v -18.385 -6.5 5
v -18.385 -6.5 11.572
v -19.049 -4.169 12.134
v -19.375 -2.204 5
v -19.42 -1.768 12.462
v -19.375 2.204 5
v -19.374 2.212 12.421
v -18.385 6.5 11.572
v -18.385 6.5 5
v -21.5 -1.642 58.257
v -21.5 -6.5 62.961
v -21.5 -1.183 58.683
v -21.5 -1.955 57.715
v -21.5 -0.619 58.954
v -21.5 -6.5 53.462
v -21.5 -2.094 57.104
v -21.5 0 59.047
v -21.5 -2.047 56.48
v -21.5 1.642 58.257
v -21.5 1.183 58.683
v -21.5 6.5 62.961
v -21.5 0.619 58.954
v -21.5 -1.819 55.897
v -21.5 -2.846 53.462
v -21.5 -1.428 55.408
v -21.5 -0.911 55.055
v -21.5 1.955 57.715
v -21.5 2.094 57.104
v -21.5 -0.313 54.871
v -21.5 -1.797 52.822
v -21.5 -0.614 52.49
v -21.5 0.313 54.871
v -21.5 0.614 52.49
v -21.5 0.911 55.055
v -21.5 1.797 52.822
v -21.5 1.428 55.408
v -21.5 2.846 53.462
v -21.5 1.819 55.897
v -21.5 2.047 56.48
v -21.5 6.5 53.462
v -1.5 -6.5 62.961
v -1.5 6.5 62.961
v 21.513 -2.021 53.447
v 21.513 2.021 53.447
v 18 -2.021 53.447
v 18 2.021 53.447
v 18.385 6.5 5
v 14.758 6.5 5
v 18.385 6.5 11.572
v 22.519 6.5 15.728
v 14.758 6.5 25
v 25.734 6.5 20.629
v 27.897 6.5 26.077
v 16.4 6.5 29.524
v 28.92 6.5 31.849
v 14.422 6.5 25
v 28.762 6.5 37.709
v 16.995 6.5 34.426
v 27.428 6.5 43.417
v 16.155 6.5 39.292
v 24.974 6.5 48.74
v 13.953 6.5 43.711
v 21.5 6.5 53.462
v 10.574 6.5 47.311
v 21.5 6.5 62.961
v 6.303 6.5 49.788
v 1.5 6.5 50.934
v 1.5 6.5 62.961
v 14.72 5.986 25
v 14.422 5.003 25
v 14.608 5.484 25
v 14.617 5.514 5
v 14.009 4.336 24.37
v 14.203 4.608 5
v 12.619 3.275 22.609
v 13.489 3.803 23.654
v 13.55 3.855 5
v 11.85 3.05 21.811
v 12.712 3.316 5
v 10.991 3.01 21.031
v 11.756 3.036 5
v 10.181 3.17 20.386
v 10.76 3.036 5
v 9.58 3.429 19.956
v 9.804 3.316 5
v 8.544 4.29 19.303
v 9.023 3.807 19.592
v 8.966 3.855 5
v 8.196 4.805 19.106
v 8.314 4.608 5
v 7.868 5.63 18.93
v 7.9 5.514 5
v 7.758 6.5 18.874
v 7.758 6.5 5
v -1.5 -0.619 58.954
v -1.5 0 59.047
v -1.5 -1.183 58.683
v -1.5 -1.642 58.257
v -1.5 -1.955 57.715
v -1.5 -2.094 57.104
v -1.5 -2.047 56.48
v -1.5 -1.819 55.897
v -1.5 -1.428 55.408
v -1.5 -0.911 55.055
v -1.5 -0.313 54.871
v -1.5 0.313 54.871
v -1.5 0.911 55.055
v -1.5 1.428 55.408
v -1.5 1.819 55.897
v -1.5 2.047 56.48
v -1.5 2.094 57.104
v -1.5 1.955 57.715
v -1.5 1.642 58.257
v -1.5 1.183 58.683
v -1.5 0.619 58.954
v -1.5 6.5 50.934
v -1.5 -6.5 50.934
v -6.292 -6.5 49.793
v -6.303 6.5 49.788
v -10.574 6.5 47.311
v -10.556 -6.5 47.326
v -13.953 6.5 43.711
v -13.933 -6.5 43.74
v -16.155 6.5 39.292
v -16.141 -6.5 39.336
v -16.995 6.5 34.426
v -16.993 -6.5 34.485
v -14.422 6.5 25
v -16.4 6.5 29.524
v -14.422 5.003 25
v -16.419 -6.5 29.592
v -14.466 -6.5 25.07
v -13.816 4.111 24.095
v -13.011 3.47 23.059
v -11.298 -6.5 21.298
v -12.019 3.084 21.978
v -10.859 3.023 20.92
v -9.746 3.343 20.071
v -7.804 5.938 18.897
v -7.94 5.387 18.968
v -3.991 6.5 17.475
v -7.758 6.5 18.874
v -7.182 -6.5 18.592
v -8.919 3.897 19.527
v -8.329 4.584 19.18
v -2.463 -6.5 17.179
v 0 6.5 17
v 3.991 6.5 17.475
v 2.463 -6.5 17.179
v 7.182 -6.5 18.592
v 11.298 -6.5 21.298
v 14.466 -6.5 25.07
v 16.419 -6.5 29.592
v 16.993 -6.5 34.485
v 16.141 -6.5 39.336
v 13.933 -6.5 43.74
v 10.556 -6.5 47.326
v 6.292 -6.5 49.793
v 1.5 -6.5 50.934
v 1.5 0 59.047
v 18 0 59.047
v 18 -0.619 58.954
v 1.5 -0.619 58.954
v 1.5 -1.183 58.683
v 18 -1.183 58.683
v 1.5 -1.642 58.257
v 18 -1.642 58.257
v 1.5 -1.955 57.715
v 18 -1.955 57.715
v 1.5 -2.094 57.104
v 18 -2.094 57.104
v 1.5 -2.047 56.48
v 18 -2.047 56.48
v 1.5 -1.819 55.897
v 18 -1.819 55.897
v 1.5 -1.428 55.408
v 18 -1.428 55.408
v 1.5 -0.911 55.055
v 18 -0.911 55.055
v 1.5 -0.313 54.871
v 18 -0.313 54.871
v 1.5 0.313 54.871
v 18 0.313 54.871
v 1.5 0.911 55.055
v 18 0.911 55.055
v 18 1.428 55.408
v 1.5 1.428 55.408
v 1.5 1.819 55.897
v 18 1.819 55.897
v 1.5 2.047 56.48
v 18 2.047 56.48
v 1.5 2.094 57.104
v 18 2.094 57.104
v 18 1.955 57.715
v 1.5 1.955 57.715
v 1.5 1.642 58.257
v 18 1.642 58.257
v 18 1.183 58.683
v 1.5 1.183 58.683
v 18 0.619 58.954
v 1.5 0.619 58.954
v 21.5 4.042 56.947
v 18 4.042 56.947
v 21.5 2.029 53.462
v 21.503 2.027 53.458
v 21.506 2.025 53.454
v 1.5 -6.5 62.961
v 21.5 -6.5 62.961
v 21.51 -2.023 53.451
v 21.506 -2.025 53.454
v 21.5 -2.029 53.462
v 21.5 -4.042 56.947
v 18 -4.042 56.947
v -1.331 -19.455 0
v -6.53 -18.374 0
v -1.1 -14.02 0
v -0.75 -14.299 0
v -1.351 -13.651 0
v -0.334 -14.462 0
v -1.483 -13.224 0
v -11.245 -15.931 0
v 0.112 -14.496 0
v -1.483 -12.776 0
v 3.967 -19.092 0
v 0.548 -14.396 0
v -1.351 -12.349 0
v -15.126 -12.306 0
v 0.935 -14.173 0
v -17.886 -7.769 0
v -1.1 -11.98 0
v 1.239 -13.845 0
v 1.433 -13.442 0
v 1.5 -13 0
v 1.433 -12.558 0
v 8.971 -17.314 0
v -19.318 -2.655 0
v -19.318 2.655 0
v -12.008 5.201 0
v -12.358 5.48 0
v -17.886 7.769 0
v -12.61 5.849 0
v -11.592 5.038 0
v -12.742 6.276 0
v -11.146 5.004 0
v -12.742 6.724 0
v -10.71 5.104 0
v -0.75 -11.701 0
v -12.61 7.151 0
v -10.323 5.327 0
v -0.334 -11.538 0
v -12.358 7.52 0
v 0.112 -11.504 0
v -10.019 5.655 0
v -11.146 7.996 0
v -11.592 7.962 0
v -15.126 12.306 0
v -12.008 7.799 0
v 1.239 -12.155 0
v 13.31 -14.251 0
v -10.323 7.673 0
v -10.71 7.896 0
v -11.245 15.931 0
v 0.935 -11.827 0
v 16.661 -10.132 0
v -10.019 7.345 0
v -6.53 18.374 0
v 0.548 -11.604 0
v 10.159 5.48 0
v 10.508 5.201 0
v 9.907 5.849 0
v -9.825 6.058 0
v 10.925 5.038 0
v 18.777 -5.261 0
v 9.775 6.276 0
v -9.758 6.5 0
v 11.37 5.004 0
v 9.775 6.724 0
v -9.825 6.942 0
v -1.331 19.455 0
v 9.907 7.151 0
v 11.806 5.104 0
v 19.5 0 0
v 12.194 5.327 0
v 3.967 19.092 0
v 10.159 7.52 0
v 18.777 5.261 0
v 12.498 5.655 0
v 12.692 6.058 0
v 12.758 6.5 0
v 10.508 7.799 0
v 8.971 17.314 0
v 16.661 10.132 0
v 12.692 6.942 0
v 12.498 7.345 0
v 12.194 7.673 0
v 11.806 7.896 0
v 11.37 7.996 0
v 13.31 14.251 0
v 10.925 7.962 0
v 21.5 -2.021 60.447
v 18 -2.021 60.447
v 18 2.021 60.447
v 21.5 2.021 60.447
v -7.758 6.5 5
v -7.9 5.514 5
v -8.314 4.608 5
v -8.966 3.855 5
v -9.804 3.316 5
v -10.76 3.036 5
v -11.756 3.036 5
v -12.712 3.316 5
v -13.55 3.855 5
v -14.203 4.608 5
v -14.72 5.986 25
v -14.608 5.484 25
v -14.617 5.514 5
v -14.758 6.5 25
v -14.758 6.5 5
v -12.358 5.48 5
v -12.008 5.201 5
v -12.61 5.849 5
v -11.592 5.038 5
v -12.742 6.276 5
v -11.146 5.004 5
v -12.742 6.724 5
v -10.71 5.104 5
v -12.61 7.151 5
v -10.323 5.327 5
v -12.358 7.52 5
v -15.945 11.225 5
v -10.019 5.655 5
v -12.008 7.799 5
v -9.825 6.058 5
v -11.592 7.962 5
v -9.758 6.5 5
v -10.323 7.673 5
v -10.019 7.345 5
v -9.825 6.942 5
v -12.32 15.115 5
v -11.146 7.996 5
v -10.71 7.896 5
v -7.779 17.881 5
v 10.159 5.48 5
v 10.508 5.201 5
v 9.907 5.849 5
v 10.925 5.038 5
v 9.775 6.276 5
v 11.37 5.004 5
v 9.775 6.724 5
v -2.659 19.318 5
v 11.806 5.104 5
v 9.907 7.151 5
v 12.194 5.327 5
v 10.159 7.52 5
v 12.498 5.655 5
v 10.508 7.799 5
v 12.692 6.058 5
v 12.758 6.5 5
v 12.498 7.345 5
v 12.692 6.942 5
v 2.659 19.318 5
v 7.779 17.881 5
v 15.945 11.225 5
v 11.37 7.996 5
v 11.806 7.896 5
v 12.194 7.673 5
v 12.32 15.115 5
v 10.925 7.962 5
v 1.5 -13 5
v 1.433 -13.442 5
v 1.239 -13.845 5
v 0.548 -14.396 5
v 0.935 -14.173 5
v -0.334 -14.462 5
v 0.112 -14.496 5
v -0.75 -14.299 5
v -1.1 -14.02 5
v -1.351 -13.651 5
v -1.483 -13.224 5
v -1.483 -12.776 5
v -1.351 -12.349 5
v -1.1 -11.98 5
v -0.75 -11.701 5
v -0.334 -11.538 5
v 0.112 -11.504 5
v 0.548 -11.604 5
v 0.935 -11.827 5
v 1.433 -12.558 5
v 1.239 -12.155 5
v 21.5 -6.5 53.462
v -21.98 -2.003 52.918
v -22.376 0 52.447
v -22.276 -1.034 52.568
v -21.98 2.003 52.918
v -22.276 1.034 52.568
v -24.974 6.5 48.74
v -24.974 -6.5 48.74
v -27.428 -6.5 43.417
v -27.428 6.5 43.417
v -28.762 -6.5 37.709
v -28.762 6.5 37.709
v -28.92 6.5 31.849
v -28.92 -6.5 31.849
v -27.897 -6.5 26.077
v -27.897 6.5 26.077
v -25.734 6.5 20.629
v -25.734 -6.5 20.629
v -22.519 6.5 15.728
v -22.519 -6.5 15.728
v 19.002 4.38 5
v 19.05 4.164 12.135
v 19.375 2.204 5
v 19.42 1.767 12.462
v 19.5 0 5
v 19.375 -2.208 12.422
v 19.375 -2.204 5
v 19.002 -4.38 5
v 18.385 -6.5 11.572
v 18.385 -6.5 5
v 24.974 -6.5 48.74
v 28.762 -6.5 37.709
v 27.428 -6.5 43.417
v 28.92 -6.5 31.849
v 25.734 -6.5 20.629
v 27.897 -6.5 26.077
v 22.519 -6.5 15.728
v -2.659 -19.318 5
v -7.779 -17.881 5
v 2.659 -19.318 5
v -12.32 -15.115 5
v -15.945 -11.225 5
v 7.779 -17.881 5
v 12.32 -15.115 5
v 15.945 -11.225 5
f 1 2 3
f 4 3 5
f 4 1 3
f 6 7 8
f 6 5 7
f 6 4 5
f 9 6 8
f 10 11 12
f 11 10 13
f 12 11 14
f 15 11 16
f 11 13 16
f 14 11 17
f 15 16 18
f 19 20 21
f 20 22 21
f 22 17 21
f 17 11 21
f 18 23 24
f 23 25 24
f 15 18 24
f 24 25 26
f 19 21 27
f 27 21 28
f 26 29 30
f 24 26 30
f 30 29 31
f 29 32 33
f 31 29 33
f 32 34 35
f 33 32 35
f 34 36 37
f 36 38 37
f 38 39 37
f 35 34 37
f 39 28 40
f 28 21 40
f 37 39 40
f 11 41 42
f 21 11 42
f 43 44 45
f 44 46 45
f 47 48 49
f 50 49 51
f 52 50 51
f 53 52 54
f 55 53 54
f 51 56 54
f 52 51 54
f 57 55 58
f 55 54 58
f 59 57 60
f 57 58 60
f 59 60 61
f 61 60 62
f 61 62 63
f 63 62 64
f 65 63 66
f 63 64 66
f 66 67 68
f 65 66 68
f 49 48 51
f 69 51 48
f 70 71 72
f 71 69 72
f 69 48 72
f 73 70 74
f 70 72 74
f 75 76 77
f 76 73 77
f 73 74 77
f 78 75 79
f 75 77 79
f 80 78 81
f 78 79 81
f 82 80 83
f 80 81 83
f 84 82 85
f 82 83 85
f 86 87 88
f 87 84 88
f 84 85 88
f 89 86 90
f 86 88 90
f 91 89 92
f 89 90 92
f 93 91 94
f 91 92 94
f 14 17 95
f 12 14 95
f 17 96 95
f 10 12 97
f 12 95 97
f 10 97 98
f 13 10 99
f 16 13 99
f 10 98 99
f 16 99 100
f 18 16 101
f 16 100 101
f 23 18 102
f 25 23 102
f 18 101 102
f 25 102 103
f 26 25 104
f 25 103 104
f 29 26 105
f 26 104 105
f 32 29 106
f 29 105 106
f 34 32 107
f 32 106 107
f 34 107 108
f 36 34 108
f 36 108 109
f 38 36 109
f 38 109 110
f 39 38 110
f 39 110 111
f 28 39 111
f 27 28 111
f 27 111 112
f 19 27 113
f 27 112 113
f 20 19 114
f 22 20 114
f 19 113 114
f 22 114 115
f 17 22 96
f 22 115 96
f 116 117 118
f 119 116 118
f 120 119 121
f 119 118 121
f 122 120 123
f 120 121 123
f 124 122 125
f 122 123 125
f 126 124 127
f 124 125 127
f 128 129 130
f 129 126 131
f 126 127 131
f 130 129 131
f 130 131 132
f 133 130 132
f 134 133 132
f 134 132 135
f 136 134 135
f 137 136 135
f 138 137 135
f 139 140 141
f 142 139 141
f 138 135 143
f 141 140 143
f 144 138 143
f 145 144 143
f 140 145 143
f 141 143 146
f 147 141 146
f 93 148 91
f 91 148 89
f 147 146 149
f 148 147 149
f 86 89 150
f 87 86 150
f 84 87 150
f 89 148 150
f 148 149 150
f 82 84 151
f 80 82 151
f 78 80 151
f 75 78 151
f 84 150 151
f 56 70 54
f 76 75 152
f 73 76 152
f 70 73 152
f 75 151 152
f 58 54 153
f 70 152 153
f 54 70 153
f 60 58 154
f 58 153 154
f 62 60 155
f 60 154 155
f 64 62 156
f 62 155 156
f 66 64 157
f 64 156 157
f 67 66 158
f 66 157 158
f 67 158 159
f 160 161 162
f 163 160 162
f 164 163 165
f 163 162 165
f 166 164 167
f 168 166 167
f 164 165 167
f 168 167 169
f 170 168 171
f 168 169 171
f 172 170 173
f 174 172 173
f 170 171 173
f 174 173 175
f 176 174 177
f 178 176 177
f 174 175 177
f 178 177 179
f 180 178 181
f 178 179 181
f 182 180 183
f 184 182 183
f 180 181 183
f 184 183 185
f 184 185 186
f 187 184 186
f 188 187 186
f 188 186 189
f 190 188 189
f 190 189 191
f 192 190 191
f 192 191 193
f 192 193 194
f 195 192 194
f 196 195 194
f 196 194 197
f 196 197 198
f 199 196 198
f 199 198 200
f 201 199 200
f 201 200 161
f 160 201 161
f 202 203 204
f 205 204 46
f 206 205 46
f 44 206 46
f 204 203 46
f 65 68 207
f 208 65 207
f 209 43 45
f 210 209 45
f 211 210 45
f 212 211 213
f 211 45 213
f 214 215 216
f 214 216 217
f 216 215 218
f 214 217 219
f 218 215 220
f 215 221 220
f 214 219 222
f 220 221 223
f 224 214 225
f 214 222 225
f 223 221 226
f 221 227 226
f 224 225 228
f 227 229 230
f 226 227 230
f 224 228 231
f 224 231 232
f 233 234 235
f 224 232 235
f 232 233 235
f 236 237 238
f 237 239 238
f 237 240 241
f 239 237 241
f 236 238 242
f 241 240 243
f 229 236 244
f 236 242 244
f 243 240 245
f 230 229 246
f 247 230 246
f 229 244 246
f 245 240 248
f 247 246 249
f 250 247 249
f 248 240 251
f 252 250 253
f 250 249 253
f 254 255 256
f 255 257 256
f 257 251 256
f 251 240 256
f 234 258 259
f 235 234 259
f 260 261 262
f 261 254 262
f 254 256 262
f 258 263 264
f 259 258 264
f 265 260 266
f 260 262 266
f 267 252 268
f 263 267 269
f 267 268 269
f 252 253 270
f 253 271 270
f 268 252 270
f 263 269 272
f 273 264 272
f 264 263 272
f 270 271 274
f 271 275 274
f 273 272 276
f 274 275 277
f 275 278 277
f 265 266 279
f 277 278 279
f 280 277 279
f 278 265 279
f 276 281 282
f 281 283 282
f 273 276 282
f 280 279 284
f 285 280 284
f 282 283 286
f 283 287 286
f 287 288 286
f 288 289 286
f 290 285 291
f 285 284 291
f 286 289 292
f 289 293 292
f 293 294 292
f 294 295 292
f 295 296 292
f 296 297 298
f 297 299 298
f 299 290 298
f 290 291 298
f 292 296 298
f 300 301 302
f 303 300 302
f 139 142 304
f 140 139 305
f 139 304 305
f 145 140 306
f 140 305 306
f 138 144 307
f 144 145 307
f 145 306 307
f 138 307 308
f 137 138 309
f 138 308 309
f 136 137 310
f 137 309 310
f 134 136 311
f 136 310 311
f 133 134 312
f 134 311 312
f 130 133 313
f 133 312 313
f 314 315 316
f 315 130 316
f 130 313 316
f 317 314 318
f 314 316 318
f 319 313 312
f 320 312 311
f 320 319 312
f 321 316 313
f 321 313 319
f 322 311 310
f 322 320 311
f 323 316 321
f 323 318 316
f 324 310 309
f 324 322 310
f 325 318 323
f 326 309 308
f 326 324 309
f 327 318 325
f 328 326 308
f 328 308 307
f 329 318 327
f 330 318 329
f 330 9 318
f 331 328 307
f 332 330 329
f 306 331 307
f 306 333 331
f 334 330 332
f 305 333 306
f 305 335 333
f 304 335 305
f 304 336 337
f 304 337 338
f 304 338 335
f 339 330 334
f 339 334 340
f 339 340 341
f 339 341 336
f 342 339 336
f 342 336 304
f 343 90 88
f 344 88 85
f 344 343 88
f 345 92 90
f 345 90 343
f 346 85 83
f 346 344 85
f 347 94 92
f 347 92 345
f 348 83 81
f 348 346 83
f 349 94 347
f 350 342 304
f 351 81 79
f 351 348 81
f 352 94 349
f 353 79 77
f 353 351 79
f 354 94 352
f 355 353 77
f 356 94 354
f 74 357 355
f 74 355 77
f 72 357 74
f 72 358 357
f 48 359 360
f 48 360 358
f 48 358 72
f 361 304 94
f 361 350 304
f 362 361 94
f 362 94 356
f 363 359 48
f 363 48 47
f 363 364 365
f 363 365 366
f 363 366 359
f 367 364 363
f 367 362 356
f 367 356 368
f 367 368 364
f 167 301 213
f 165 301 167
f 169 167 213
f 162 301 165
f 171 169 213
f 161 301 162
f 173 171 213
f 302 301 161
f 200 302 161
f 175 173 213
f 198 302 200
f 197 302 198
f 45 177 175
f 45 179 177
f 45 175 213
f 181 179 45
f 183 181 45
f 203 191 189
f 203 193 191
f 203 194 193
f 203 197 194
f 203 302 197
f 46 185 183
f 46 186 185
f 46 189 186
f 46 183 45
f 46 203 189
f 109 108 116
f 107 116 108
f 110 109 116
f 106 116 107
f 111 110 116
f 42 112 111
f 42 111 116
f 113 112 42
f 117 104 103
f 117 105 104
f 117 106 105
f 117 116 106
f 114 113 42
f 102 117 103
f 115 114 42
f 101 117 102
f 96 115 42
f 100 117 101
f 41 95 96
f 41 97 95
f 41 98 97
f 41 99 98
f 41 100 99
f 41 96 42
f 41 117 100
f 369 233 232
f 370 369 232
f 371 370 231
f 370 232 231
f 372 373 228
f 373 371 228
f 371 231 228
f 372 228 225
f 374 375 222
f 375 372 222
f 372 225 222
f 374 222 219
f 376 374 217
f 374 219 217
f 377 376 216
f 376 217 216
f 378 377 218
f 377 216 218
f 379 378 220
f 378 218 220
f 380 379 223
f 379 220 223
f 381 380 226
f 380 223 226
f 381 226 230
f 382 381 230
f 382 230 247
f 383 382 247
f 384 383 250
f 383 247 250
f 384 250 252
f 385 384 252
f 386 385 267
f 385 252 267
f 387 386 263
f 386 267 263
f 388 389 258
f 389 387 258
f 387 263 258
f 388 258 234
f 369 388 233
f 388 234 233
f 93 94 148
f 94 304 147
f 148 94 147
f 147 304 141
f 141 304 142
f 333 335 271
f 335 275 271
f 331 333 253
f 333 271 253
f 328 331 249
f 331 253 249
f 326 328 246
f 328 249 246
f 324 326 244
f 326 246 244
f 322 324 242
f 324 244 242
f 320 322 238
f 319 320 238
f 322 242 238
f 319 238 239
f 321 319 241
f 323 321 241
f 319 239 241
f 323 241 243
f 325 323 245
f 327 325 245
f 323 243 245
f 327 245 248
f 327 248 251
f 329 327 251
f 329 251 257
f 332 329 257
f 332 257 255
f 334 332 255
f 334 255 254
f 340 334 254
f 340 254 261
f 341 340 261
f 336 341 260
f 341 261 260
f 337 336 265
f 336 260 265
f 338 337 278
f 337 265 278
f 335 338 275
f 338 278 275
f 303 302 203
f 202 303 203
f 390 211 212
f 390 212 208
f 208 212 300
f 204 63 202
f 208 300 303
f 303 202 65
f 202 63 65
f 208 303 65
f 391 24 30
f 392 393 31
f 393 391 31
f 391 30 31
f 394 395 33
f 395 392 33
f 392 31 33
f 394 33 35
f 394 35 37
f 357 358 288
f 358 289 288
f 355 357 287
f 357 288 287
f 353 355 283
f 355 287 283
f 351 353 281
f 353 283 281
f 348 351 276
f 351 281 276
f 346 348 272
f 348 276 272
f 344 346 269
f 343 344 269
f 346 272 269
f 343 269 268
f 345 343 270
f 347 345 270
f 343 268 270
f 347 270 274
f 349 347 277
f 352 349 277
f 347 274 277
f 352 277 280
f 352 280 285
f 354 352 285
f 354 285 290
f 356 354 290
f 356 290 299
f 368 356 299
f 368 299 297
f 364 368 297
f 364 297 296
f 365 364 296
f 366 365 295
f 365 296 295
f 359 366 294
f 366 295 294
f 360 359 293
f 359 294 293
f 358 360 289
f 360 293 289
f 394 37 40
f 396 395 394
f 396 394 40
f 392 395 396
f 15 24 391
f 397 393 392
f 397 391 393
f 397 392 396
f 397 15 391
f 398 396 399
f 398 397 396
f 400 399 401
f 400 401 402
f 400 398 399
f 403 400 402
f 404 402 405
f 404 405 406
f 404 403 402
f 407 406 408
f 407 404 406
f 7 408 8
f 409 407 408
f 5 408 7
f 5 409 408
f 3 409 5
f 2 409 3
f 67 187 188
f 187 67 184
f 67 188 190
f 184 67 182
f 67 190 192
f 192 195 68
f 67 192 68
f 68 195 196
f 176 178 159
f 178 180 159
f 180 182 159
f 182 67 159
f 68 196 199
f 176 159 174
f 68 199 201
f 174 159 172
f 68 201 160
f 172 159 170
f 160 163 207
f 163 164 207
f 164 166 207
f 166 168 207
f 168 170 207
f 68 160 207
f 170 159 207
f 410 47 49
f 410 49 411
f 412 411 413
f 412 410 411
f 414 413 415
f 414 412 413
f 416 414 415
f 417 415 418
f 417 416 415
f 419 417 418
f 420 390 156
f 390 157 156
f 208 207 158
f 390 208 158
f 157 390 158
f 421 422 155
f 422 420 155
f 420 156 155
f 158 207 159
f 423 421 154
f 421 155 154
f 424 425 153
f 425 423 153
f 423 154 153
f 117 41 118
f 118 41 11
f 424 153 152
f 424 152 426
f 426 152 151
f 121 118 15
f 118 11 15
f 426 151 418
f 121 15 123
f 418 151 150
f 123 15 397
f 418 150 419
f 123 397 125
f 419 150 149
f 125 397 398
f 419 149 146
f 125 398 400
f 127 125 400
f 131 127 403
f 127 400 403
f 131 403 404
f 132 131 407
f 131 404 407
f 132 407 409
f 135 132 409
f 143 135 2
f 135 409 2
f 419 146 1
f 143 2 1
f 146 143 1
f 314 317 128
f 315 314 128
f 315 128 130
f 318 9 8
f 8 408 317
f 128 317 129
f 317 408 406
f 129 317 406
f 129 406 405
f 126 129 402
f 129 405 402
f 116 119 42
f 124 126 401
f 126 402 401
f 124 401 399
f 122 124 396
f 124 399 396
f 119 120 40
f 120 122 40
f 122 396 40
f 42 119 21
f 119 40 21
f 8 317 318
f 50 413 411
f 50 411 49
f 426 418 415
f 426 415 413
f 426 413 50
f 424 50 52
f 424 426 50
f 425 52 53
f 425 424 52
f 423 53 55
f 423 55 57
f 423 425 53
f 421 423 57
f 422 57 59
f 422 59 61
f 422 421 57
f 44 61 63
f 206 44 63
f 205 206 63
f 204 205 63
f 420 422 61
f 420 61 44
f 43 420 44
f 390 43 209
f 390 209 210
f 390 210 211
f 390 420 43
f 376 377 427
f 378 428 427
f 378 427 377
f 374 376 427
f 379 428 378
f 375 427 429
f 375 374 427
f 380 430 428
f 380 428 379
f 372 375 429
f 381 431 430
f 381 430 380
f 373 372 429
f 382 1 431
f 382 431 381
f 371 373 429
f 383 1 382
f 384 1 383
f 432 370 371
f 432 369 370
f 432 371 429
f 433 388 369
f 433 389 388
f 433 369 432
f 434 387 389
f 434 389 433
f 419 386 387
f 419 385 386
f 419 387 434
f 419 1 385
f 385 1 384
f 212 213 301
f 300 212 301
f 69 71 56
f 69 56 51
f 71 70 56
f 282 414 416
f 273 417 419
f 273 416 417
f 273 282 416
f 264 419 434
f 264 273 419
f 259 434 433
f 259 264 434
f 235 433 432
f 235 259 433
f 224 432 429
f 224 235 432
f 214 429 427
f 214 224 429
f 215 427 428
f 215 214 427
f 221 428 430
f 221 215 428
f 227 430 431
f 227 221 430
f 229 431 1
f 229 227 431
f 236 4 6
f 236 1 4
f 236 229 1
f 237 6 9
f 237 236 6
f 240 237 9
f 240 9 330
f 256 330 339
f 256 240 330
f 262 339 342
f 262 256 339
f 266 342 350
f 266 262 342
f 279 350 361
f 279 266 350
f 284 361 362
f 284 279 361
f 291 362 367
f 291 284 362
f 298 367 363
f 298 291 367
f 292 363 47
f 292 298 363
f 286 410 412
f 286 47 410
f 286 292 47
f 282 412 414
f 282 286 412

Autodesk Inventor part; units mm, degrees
ref_plane "YZ Plane" through (0, 0, 0) normal (1, 0, 0) x (0, 1, 0)
ref_plane "XZ Plane" through (0, 0, 0) normal (0, 1, 0) x (-1, 0, 0)
ref_plane "XY Plane" through (0, 0, 0) normal (0, 0, 1) x (1, 0, 0)
sketch "Skizze1" plane through (0, 0, 0) normal (0, 0, 1) x (1, 0, 0)
  circle A0 centre (-11.2583, 6.5) radius 1.5 projected
  circle A1 centre (-11.2583, -6.5) radius 1.5 projected
  circle A2 centre (0, -13) radius 1.5 projected
  circle A3 centre (11.2583, -6.5) radius 1.5 projected
  circle A4 centre (11.2583, 6.5) radius 1.5 projected
  circle A5 centre (0, 13) radius 1.5 projected
  arc A6 (14.3761, 1.8914) -> (11.9393, 3.5783) centre (12.3932, 1.6305) ccw projected
  arc A7 (14.3761, -1.8914) -> (14.3761, 1.8914) centre (0, 0) ccw projected
  arc A8 (11.9393, -3.5783) -> (14.3761, -1.8914) centre (12.3932, -1.6305) ccw projected
  arc A9 (11.9393, -3.5783) -> (9.0685, -8.5505) centre (11.2583, -6.5) ccw projected
  arc A10 (8.826, -11.5044) -> (9.0685, -8.5505) centre (7.6087, -9.9176) ccw projected
  arc A11 (5.5501, -13.3958) -> (8.826, -11.5044) centre (0, 0) ccw projected
  arc A12 (2.8707, -12.1288) -> (5.5501, -13.3958) centre (4.7846, -11.5481) ccw projected
  arc A13 (2.8707, -12.1288) -> (-2.8707, -12.1288) centre (0, -13) ccw projected
  arc A14 (-5.5501, -13.3958) -> (-2.8707, -12.1288) centre (-4.7846, -11.5481) ccw projected
  arc A15 (-8.826, -11.5044) -> (-5.5501, -13.3958) centre (0, 0) ccw projected
  arc A16 (-9.0685, -8.5505) -> (-8.826, -11.5044) centre (-7.6087, -9.9176) ccw projected
  arc A17 (-9.0685, -8.5505) -> (-11.9393, -3.5783) centre (-11.2583, -6.5) ccw projected
  arc A18 (-14.3761, -1.8914) -> (-11.9393, -3.5783) centre (-12.3932, -1.6305) ccw projected
  arc A19 (-14.3761, 1.8914) -> (-14.3761, -1.8914) centre (0, 0) ccw projected
  arc A20 (-11.9393, 3.5783) -> (-14.3761, 1.8914) centre (-12.3932, 1.6305) ccw projected
  arc A21 (-11.9393, 3.5783) -> (-9.0685, 8.5505) centre (-11.2583, 6.5) ccw projected
  arc A22 (-8.826, 11.5044) -> (-9.0685, 8.5505) centre (-7.6087, 9.9176) ccw projected
  arc A23 (-5.5501, 13.3958) -> (-8.826, 11.5044) centre (0, 0) ccw projected
  arc A24 (-2.8707, 12.1288) -> (-5.5501, 13.3958) centre (-4.7846, 11.5481) ccw projected
  arc A25 (-2.8707, 12.1288) -> (2.8707, 12.1288) centre (0, 13) ccw projected
  arc A26 (5.5501, 13.3958) -> (2.8707, 12.1288) centre (4.7846, 11.5481) ccw projected
  arc A27 (8.826, 11.5044) -> (5.5501, 13.3958) centre (0, 0) ccw projected
  arc A28 (9.0685, 8.5505) -> (8.826, 11.5044) centre (7.6087, 9.9176) ccw projected
  arc A29 (9.0685, 8.5505) -> (11.9393, 3.5783) centre (11.2583, 6.5) ccw projected
  circle A30 centre (0, 0) radius 17.5 projected
  circle A31 centre (0, 0) radius 19.5
  point P0 (0, 0)
  dimension "d0" = 39
extrude "Extrusion1" add sketch "Skizze1" along normal blind 5 contours A7 A8 A9 A10 A11 A12 A13 A14 A15 A16 A17 A18 A19 A20 A21 A22 A23 A24 A25 A26 A27 A28 A29 A6 | A30 | A31
ref_plane "Arbeitsebene1" through (11.2583, -6.5, 0) normal (0, -1, 0) x (0, 0, 1)
sketch "Skizze7" plane through (11.2583, -6.5, 0) normal (0, -1, 0) x (0, 0, 1)
  line L0 (0, 21.0167) -> (5, 21.0167) projected
  line L1 (5, 21.0167) -> (5, 1.5) projected
  line L2 (5, 1.5) -> (0, 1.5) projected
  line L3 (0, 1.5) -> (0, 21.0167) projected
  line L4 (5, -7.1264) -> (0, -7.1264) projected
  line L5 (0, -7.1264) -> (0, -1.5) projected
  line L6 (0, -1.5) -> (5, -1.5) projected
  line L7 (5, -1.5) -> (5, -7.1264) projected
  line L8 (0, 29.6431) -> (5, 29.6431) projected
  line L9 (5, 29.6431) -> (5, 24.0167) projected
  line L10 (5, 24.0167) -> (0, 24.0167) projected
  line L11 (0, 24.0167) -> (0, 29.6431) projected
  line L12 (5, 1.5) -> (17, 1.5)
  line L13 (17, 1.5) -> (17, 21.0167)
  line L14 (17, 21.0167) -> (5, 21.0167)
  line L15 (5, 21.0167) -> (5, 1.5)
  arc A0 (50.9337, 12.7583) -> (50.9337, 9.7583) centre (34, 11.2583) ccw
  arc A1 (62.9612, 12.7583) -> (62.9612, 9.7583) centre (34, 11.2583) ccw
  line L16 (50.9337, 9.7583) -> (62.9612, 9.7583)
  line L17 (50.9337, 12.7583) -> (62.9612, 12.7583)
  line L18 (34, 11.2583) -> (5, 11.2583) construction
  line L19 (5, -7.1264) -> (11.5723, -7.1264)
  line L20 (5, 29.6431) -> (11.5723, 29.6431)
  line L21 (5, -7.1264) -> (5, 29.6431)
  point P0 (0, 11.2583)
  dimension "d26" = 3
  dimension "d27" = 17
  dimension "d28" = 12
extrude "Extrusion6" add sketch "Skizze7" against normal blind 13 contours L14 A1 L1 | L21 L9 L20 A1 L14 | A1 L12 L1 | A1 L14 L13 L12 | A1 L17 A0 L13 L14 | L12 A1 L19 L7 L21 | L12 L13 A0 L16 A1
sketch "Skizze8" plane through (1.5, -6.5, 50.9337) normal (-1, 0, 0) x (0, 0, 1)
  line L0 (12.0275, 0) -> (0, 0) projected
  line L1 (0, 0) -> (0, 13) projected
  line L2 (0, 13) -> (12.0275, 13) projected
  line L3 (12.0275, 13) -> (12.0275, 0) projected
  line L4 (-45.9337, 25.9422) -> (-45.9337, 19.5) projected
  line L5 (-45.9337, 19.5) -> (-45.9337, 13) projected
  line L6 (-45.9337, 13) -> (-33.8674, 13) projected
  line L7 (-33.8674, 13) -> (-33.8674, 0) projected
  line L8 (-33.8674, 0) -> (-45.9337, 0) projected
  line L9 (-45.9337, 0) -> (-45.9337, -6.5) projected
  line L10 (-45.9337, -6.5) -> (-50.9337, -6.5) projected
  line L11 (-50.9337, -6.5) -> (-50.9337, 19.5) projected
  line L12 (-50.9337, 19.5) -> (-50.9337, 25.9422) projected
  line L13 (-50.9337, 25.9422) -> (-45.9337, 25.9422) projected
  line L14 (-45.9337, 19.5) -> (-50.9337, 19.5) projected
  line L15 (-45.9337, -6.5) -> (-45.9337, -12.9422) projected
  line L16 (-45.9337, -12.9422) -> (-50.9337, -12.9422) projected
  line L17 (-50.9337, -12.9422) -> (-50.9337, -6.5) projected
  point P0 (-50.9337, 6.5)
extrude "Extrusion7" add sketch "Skizze8" against normal blind 20 contours L0 L1 L2 L3
sketch "Skizze9" plane through (-1.5, -6.5, 62.9612) normal (1, 0, 0) x (0, 0, -1)
  line L0 (12.0275, 0) -> (0, 0) projected
  line L1 (0, 0) -> (0, 13) projected
  line L2 (0, 13) -> (12.0275, 13) projected
  line L3 (12.0275, 13) -> (12.0275, 0) projected
  line L4 (57.9612, -12.9422) -> (57.9612, -6.5) projected
  line L5 (57.9612, -6.5) -> (57.9612, 0) projected
  line L6 (57.9612, 0) -> (45.8949, 0) projected
  line L7 (45.8949, 0) -> (45.8949, 13) projected
  line L8 (45.8949, 13) -> (57.9612, 13) projected
  line L9 (57.9612, 13) -> (57.9612, 19.5) projected
  line L10 (57.9612, 19.5) -> (62.9612, 19.5) projected
  line L11 (62.9612, 19.5) -> (62.9612, -6.5) projected
  line L12 (62.9612, -6.5) -> (62.9612, -12.9422) projected
  line L13 (62.9612, -12.9422) -> (57.9612, -12.9422) projected
  line L14 (57.9612, -6.5) -> (62.9612, -6.5) projected
  line L15 (57.9612, 19.5) -> (57.9612, 25.9422) projected
  line L16 (57.9612, 25.9422) -> (62.9612, 25.9422) projected
  line L17 (62.9612, 25.9422) -> (62.9612, 19.5) projected
  point P0 (62.9612, 6.5)
extrude "Extrusion8" add sketch "Skizze9" against normal blind 20 contours L0 L1 L2 L3
sketch "Skizze10" plane through (0, 0, 5) normal (0, 0, 1) x (1, 0, 0)
  circle A0 centre (0, 13) radius 1.5 projected
  circle A1 centre (11.2583, 6.5) radius 1.5 projected
  circle A2 centre (11.2583, -6.5) radius 1.5 projected
  circle A3 centre (0, -13) radius 1.5 projected
  circle A4 centre (-11.2583, -6.5) radius 1.5 projected
  circle A5 centre (-11.2583, 6.5) radius 1.5 projected
  circle A6 centre (0, 0) radius 19.5 projected
  circle A7 centre (11.2583, 6.5) radius 3.5
  circle A8 centre (-11.2583, 6.5) radius 3.5
  line L0 (12.7583, 6.5) -> (9.7583, 6.5) projected
  point P0 (0, 0)
  dimension "d35" = 7
extrude "Extrusion9" cut sketch "Skizze10" along normal blind 20 contours L0 A1 | A1 L0 | A5 | A7 | A8
sketch "Skizze11" plane through (0, 0, 0) normal (0, 0, -1) x (-1, 0, 0)
  circle A0 centre (0, 13) radius 1.5 projected
  circle A1 centre (-11.2583, 6.5) radius 1.5 projected
  circle A2 centre (-11.2583, -6.5) radius 1.5 projected
  circle A3 centre (0, -13) radius 1.5 projected
  circle A4 centre (11.2583, -6.5) radius 1.5 projected
  circle A5 centre (11.2583, 6.5) radius 1.5 projected
  circle A6 centre (0, 0) radius 19.5 projected
  point P0 (0, 0)
extrude "Extrusion10" add sketch "Skizze11" against normal up to surface (5 mm away) contours A0 | A2 | A4
sketch "Skizze13" plane through (-21.5, -6.5, 62.9612) normal (-1, 0, 0) x (0, 0, 1)
  line L0 (-12.0275, 0) -> (0, 0) projected
  line L1 (-12.0275, 0) -> (-12.0275, 13) projected
  line L2 (0, 13) -> (-12.0275, 13) projected
  line L3 (0, 0) -> (0, 13) projected
  line L4 (-12.0275, 0) -> (0, 0)
  line L5 (0, 0) -> (0, 13)
  line L6 (0, 13) -> (-12.0275, 13)
  line L7 (-12.0275, 13) -> (-12.0275, 0)
  line L8 (-12.0275, 0) -> (0, 13) construction
  line L9 (0, 0) -> (-12.0275, 13) construction
  point P0 (-62.9612, 6.5)
  point P1 (-6.0137, 6.5)
hole "Bohrung2" at (-21.5, 0, 56.9474) direction (1, 0, 0) diameter 4.2 end through all
sketch "Skizze14" plane through (-21.5, -6.5, 62.9612) normal (-1, 0, 0) x (0, 0, 1)
  circle A0 centre (-6.0137, 6.5) radius 2.1 projected
  line L0 (-9.4997, 0) -> (-9.4997, 13) projected
  line L1 (-9.4997, 0) -> (0, 0) projected
  line L2 (0, 0) -> (0, 13) projected
  line L3 (0, 13) -> (-9.4997, 13) projected
  circle A1 centre (-6.0137, 6.5) radius 4.5
  point P0 (-62.9612, 6.5)
  dimension "d47" = 9
extrude "Extrusion11" cut sketch "Skizze14" along normal blind 2 contours A0 | A1 L0 | L0 A1
sketch "Skizze15" plane through (21.5, -6.5, 50.9337) normal (1, 0, 0) x (0, 0, -1)
  circle A0 centre (-6.0137, 6.5) radius 2.1 projected
  line L0 (-2.5278, 13) -> (-2.5278, 0) projected
  line L1 (-2.5278, 13) -> (-12.0275, 13) projected
  line L2 (-12.0275, 13) -> (-12.0275, 0) projected
  line L3 (-12.0275, 0) -> (-2.5278, 0) projected
  line L4 (-6.0137, 10.5415) -> (-2.5137, 8.5207)
  line L5 (-2.5137, 8.5207) -> (-2.5137, 4.4793)
  line L6 (-2.5137, 4.4793) -> (-6.0137, 2.4585)
  line L7 (-6.0137, 2.4585) -> (-9.5137, 4.4793)
  line L8 (-9.5137, 4.4793) -> (-9.5137, 8.5207)
  line L9 (-9.5137, 8.5207) -> (-6.0137, 10.5415)
  line L10 (-12.0275, 13) -> (-12.0275, 0) projected
  point P0 (50.9337, 6.5)
  dimension "d50" = 7
extrude "Extrusion12" cut sketch "Skizze15" along normal mid plane 7 contours A0 | L4 L5 L6 L0 | L0 L6 L7 L8 L9 L4
sketch "Skizze16" plane through (0, 0, 5) normal (0, 0, 1) x (1, 0, 0)
  line L0 (-18.3848, -6.5) -> (-18.3848, 6.5) projected
  arc A0 (-18.3848, 6.5) -> (-18.3848, -6.5) centre (0, 0) ccw projected
  line L1 (18.3848, 6.5) -> (18.3848, -6.5) projected
  arc A1 (18.3848, -6.5) -> (18.3848, 6.5) centre (0, 0) ccw projected
  point P0 (0, 0)
extrude "Extrusion13" add sketch "Skizze16" along normal blind 10
sketch "Skizze2" plane through (0, 0, 5) normal (0, 0, 1) x (1, 0, 0)
  circle A0 centre (0, 0) radius 7.5
  dimension "d3" = 15
  dimension "d20" = 7
  dimension "d8" = 7
sketch "Skizze4" plane through (0, 0, 10) normal (0, 0, 1) x (1, 0, 0)
  point P0 (0, 0)
sketch "Skizze5" plane through (0, 0, 3) normal (0, 0, -1) x (-1, 0, 0)
  circle A0 centre (0, 0) radius 2 projected
  circle A1 centre (0, 0) radius 2 projected
properties part number "GripperMountProxxon" material "ABS-Kunststoff"
